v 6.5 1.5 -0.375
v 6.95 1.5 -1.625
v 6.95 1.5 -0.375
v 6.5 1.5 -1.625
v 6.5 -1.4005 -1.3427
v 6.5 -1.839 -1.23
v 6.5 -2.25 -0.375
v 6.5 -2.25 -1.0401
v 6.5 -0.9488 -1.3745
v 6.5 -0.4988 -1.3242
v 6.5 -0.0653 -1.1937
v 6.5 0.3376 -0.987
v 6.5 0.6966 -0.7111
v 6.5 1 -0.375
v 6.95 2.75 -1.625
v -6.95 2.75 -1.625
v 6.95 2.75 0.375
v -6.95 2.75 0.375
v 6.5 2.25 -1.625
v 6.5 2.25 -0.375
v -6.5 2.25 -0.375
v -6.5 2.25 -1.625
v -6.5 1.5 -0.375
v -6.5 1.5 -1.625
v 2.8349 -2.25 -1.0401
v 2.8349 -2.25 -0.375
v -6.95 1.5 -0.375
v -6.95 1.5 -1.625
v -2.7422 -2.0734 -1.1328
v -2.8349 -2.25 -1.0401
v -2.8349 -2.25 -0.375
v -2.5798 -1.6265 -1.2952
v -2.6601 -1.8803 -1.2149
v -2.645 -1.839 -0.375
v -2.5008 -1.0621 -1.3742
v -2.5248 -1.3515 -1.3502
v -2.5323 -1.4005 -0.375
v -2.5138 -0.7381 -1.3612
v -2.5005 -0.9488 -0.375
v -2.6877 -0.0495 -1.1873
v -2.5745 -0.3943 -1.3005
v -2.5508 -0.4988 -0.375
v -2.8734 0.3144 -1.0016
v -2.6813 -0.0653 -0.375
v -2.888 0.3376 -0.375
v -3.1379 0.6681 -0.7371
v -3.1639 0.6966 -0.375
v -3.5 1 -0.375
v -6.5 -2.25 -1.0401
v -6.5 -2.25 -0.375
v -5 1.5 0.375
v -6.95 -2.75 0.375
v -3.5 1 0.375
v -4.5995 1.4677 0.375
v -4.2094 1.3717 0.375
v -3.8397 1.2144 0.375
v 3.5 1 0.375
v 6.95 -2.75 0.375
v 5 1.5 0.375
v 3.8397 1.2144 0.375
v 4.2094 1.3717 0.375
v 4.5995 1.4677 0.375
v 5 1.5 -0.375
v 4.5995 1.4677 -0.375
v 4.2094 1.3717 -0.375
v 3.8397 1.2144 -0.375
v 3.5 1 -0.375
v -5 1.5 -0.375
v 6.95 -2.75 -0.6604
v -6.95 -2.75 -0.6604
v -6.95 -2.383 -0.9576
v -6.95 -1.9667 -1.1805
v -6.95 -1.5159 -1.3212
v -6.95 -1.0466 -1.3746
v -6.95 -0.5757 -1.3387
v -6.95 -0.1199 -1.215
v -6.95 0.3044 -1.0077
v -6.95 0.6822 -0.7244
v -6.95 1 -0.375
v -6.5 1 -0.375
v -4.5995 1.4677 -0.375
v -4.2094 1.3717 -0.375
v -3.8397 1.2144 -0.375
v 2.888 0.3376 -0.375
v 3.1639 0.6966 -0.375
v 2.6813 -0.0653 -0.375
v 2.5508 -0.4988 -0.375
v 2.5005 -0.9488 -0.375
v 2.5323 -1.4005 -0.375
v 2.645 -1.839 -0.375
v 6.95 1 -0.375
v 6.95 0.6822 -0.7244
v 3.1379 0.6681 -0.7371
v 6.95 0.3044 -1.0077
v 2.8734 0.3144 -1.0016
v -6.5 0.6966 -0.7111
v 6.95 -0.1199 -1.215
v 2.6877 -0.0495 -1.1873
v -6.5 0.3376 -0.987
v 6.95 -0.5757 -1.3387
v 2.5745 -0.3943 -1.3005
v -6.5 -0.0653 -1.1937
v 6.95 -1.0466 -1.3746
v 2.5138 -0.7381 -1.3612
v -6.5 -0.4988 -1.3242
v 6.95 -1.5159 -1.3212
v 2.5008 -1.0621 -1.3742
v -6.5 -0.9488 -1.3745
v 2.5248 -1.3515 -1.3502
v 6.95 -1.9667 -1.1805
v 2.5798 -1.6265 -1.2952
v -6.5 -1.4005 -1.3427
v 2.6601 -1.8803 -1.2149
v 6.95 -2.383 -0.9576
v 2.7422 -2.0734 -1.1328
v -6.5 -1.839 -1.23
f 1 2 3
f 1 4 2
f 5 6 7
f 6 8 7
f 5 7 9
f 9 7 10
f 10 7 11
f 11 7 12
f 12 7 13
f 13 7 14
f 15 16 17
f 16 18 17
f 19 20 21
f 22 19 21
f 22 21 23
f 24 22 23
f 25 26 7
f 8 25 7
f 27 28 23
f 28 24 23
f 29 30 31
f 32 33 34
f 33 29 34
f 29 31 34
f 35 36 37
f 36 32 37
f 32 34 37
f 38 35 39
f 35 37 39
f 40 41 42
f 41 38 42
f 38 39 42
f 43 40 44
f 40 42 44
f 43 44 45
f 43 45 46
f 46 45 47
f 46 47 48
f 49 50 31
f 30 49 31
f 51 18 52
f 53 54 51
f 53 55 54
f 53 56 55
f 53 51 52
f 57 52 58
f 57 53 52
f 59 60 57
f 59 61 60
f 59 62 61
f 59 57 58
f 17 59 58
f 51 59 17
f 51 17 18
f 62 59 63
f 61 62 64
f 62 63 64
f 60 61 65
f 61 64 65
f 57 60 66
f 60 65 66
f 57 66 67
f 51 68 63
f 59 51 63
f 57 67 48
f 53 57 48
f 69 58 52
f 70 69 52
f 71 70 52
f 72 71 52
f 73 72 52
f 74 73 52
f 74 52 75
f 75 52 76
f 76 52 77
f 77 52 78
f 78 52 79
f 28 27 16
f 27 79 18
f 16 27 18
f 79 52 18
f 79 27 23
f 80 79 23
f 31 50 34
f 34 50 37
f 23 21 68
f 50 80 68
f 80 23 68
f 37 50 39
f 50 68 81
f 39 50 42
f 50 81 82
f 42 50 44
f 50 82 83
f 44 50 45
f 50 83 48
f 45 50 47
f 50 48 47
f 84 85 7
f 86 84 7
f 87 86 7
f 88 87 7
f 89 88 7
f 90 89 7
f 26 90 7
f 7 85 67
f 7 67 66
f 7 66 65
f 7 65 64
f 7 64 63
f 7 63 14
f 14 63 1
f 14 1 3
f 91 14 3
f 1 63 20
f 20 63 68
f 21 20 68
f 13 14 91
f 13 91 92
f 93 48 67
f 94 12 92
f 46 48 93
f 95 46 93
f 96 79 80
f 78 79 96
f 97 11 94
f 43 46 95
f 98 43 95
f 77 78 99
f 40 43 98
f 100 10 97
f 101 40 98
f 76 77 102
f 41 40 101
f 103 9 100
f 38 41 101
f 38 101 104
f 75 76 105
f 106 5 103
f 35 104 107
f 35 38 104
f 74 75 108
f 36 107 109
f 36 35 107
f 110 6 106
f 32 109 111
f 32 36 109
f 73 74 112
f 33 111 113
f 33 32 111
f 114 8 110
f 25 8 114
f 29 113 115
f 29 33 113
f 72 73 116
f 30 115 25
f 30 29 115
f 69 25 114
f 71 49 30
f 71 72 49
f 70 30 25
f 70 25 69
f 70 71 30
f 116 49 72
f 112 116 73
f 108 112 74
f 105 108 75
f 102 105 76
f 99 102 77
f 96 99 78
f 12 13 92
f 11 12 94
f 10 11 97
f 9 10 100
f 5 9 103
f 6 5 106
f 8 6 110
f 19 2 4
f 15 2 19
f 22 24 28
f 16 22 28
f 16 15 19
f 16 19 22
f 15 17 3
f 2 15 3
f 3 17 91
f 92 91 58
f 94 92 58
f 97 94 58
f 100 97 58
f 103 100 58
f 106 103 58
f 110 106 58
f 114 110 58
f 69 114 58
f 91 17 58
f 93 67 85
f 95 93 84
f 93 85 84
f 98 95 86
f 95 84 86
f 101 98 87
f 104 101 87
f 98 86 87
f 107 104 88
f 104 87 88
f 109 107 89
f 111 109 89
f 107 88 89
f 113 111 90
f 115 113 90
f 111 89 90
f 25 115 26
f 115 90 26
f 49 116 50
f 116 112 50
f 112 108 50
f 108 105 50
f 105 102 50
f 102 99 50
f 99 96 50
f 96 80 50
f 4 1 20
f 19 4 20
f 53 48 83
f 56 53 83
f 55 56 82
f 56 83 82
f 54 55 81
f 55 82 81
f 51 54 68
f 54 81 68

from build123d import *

# Parameters (mm, degrees)
SKETCH1_W               = 13
SKETCH1_H               = 4.5
BOSS_EXTRUDE1_DEPTH     = 0.375
BOSS_EXTRUDE2_DEPTH     = 1.25
BOSS_EXTRUDE3_DEPTH     = 2
SKETCH4_W               = 7
SKETCH4_H               = 0.5
CUT_EXTRUDE1_DEPTH      = 3.75
CUT_EXTRUDE2_DEPTH      = 7.95
CUT_EXTRUDE2_DEPTH_BACK = 7.95


with BuildPart() as part:
    # Sketch1 → Boss-Extrude1 (new body, symmetric)
    with BuildSketch(Plane.XY):
        Polygon((6.95, 2.25), (6.95, 2.75), (6.5, 2.75), (-6.5, 2.75), (-6.95, 2.75), (-6.95, 2.25), (-6.95, -2.25), (-6.95, -2.75), (-6.5, -2.75), (6.5, -2.75), (6.95, -2.75), (6.95, -2.25), align=None)
        Rectangle(SKETCH1_W, SKETCH1_H, mode=Mode.SUBTRACT)
        with BuildLine():
            Line((6.5, 1.875), (6.5, 2.25))
            Line((6.5, 2.25), (-6.5, 2.25))
            Line((-6.5, 2.25), (-6.5, 1.875))
            Line((-6.5, 1.875), (-6.5, 1))
            Line((-6.5, 1), (-6.5, -2.25))
            Line((-6.5, -2.25), (-2.834936491, -2.25))
            ThreePointArc((-2.834936491, -2.25), (-2.834936491, 0.25), (-5, 1.5))
            Line((-5, 1.5), (5, 1.5))
            ThreePointArc((5, 1.5), (2.834936491, 0.25), (2.834936491, -2.25))
            Line((2.834936491, -2.25), (6.5, -2.25))
            Line((6.5, -2.25), (6.5, 1))
            Line((6.5, 1), (6.5, 1.875))
        make_face()
        with BuildLine():
            Line((-2.834936491, -2.25), (2.834936491, -2.25))
            ThreePointArc((2.834936491, -2.25), (2.834936491, 0.25), (5, 1.5))
            Line((5, 1.5), (-5, 1.5))
            ThreePointArc((-5, 1.5), (-2.834936491, 0.25), (-2.834936491, -2.25))
        make_face()
    extrude(amount=BOSS_EXTRUDE1_DEPTH, both=True)

    # Sketch2 → Boss-Extrude2 (add)
    with BuildSketch(Plane(origin=(0, 0, -0.375), x_dir=(-1, 0, 0), z_dir=(0, 0, -1))):
        Polygon((-6.95, 2.25), (-6.95, -2.25), (-6.95, -2.75), (-6.5, -2.75), (6.5, -2.75), (6.95, -2.75), (6.95, -2.25), (6.95, 2.25), (6.95, 2.75), (6.5, 2.75), (-6.5, 2.75), (-6.95, 2.75), align=None)
        Polygon((-6.5, 1), (-6.5, 1.875), (-6.5, 2.25), (6.5, 2.25), (6.5, 1.875), (6.5, 1), (6.5, -2.25), (2.834936491, -2.25), (-2.834936491, -2.25), (-6.5, -2.25), align=None, mode=Mode.SUBTRACT)
    extrude(amount=BOSS_EXTRUDE2_DEPTH)

    # Sketch3 → Boss-Extrude3 (add)
    with BuildSketch(Plane(origin=(0, 0, -0.375), x_dir=(-1, 0, 0), z_dir=(0, 0, -1))):
        with BuildLine():
            ThreePointArc((-5, 1.5), (-2.834936491, 0.25), (-2.834936491, -2.25))
            Line((-2.834936491, -2.25), (2.834936491, -2.25))
            ThreePointArc((2.834936491, -2.25), (2.834936491, 0.25), (5, 1.5))
            Line((5, 1.5), (-5, 1.5))
        make_face()
    extrude(amount=BOSS_EXTRUDE3_DEPTH)

    # Sketch4 → Cut-Extrude1 (cut, through all)
    with BuildSketch(Plane(origin=(0, 0, -2.375), x_dir=(-1, 0, 0), z_dir=(0, 0, -1))):
        with Locations((0, 1.25)):
            Rectangle(SKETCH4_W, SKETCH4_H)
        with BuildLine():
            Line((3.5, 1.5), (3.5, 1))
            ThreePointArc((3.5, 1), (4.209430585, 1.371708245), (5, 1.5))
            Line((5, 1.5), (3.5, 1.5))
        make_face()
        with BuildLine():
            ThreePointArc((-5, 1.5), (-4.209430585, 1.371708245), (-3.5, 1))
            Line((-3.5, 1), (-3.5, 1.5))
            Line((-3.5, 1.5), (-5, 1.5))
        make_face()
    extrude(amount=-CUT_EXTRUDE1_DEPTH, mode=Mode.SUBTRACT)

    # Sketch5 → Cut-Extrude2 (cut, two sides)
    with BuildSketch(Plane(origin=(0, 0, 0), x_dir=(0, 0, -1), z_dir=(1, 0, 0))) as cut_extrude2_sk:
        with BuildLine():
            Line((3.875, 1.5), (0.375, 1.5))
            Line((0.375, 1.5), (0.375, 1))
            ThreePointArc((0.375, 1), (1.246708245, -1.790569415), (-1.125, -3.5))
            Line((-1.125, -3.5), (3.875, -3.5))
            Line((3.875, -3.5), (3.875, 1.5))
        make_face()
    extrude(amount=CUT_EXTRUDE2_DEPTH, mode=Mode.SUBTRACT)
    extrude(cut_extrude2_sk.sketch, amount=-CUT_EXTRUDE2_DEPTH_BACK, mode=Mode.SUBTRACT)


solid = part.part
